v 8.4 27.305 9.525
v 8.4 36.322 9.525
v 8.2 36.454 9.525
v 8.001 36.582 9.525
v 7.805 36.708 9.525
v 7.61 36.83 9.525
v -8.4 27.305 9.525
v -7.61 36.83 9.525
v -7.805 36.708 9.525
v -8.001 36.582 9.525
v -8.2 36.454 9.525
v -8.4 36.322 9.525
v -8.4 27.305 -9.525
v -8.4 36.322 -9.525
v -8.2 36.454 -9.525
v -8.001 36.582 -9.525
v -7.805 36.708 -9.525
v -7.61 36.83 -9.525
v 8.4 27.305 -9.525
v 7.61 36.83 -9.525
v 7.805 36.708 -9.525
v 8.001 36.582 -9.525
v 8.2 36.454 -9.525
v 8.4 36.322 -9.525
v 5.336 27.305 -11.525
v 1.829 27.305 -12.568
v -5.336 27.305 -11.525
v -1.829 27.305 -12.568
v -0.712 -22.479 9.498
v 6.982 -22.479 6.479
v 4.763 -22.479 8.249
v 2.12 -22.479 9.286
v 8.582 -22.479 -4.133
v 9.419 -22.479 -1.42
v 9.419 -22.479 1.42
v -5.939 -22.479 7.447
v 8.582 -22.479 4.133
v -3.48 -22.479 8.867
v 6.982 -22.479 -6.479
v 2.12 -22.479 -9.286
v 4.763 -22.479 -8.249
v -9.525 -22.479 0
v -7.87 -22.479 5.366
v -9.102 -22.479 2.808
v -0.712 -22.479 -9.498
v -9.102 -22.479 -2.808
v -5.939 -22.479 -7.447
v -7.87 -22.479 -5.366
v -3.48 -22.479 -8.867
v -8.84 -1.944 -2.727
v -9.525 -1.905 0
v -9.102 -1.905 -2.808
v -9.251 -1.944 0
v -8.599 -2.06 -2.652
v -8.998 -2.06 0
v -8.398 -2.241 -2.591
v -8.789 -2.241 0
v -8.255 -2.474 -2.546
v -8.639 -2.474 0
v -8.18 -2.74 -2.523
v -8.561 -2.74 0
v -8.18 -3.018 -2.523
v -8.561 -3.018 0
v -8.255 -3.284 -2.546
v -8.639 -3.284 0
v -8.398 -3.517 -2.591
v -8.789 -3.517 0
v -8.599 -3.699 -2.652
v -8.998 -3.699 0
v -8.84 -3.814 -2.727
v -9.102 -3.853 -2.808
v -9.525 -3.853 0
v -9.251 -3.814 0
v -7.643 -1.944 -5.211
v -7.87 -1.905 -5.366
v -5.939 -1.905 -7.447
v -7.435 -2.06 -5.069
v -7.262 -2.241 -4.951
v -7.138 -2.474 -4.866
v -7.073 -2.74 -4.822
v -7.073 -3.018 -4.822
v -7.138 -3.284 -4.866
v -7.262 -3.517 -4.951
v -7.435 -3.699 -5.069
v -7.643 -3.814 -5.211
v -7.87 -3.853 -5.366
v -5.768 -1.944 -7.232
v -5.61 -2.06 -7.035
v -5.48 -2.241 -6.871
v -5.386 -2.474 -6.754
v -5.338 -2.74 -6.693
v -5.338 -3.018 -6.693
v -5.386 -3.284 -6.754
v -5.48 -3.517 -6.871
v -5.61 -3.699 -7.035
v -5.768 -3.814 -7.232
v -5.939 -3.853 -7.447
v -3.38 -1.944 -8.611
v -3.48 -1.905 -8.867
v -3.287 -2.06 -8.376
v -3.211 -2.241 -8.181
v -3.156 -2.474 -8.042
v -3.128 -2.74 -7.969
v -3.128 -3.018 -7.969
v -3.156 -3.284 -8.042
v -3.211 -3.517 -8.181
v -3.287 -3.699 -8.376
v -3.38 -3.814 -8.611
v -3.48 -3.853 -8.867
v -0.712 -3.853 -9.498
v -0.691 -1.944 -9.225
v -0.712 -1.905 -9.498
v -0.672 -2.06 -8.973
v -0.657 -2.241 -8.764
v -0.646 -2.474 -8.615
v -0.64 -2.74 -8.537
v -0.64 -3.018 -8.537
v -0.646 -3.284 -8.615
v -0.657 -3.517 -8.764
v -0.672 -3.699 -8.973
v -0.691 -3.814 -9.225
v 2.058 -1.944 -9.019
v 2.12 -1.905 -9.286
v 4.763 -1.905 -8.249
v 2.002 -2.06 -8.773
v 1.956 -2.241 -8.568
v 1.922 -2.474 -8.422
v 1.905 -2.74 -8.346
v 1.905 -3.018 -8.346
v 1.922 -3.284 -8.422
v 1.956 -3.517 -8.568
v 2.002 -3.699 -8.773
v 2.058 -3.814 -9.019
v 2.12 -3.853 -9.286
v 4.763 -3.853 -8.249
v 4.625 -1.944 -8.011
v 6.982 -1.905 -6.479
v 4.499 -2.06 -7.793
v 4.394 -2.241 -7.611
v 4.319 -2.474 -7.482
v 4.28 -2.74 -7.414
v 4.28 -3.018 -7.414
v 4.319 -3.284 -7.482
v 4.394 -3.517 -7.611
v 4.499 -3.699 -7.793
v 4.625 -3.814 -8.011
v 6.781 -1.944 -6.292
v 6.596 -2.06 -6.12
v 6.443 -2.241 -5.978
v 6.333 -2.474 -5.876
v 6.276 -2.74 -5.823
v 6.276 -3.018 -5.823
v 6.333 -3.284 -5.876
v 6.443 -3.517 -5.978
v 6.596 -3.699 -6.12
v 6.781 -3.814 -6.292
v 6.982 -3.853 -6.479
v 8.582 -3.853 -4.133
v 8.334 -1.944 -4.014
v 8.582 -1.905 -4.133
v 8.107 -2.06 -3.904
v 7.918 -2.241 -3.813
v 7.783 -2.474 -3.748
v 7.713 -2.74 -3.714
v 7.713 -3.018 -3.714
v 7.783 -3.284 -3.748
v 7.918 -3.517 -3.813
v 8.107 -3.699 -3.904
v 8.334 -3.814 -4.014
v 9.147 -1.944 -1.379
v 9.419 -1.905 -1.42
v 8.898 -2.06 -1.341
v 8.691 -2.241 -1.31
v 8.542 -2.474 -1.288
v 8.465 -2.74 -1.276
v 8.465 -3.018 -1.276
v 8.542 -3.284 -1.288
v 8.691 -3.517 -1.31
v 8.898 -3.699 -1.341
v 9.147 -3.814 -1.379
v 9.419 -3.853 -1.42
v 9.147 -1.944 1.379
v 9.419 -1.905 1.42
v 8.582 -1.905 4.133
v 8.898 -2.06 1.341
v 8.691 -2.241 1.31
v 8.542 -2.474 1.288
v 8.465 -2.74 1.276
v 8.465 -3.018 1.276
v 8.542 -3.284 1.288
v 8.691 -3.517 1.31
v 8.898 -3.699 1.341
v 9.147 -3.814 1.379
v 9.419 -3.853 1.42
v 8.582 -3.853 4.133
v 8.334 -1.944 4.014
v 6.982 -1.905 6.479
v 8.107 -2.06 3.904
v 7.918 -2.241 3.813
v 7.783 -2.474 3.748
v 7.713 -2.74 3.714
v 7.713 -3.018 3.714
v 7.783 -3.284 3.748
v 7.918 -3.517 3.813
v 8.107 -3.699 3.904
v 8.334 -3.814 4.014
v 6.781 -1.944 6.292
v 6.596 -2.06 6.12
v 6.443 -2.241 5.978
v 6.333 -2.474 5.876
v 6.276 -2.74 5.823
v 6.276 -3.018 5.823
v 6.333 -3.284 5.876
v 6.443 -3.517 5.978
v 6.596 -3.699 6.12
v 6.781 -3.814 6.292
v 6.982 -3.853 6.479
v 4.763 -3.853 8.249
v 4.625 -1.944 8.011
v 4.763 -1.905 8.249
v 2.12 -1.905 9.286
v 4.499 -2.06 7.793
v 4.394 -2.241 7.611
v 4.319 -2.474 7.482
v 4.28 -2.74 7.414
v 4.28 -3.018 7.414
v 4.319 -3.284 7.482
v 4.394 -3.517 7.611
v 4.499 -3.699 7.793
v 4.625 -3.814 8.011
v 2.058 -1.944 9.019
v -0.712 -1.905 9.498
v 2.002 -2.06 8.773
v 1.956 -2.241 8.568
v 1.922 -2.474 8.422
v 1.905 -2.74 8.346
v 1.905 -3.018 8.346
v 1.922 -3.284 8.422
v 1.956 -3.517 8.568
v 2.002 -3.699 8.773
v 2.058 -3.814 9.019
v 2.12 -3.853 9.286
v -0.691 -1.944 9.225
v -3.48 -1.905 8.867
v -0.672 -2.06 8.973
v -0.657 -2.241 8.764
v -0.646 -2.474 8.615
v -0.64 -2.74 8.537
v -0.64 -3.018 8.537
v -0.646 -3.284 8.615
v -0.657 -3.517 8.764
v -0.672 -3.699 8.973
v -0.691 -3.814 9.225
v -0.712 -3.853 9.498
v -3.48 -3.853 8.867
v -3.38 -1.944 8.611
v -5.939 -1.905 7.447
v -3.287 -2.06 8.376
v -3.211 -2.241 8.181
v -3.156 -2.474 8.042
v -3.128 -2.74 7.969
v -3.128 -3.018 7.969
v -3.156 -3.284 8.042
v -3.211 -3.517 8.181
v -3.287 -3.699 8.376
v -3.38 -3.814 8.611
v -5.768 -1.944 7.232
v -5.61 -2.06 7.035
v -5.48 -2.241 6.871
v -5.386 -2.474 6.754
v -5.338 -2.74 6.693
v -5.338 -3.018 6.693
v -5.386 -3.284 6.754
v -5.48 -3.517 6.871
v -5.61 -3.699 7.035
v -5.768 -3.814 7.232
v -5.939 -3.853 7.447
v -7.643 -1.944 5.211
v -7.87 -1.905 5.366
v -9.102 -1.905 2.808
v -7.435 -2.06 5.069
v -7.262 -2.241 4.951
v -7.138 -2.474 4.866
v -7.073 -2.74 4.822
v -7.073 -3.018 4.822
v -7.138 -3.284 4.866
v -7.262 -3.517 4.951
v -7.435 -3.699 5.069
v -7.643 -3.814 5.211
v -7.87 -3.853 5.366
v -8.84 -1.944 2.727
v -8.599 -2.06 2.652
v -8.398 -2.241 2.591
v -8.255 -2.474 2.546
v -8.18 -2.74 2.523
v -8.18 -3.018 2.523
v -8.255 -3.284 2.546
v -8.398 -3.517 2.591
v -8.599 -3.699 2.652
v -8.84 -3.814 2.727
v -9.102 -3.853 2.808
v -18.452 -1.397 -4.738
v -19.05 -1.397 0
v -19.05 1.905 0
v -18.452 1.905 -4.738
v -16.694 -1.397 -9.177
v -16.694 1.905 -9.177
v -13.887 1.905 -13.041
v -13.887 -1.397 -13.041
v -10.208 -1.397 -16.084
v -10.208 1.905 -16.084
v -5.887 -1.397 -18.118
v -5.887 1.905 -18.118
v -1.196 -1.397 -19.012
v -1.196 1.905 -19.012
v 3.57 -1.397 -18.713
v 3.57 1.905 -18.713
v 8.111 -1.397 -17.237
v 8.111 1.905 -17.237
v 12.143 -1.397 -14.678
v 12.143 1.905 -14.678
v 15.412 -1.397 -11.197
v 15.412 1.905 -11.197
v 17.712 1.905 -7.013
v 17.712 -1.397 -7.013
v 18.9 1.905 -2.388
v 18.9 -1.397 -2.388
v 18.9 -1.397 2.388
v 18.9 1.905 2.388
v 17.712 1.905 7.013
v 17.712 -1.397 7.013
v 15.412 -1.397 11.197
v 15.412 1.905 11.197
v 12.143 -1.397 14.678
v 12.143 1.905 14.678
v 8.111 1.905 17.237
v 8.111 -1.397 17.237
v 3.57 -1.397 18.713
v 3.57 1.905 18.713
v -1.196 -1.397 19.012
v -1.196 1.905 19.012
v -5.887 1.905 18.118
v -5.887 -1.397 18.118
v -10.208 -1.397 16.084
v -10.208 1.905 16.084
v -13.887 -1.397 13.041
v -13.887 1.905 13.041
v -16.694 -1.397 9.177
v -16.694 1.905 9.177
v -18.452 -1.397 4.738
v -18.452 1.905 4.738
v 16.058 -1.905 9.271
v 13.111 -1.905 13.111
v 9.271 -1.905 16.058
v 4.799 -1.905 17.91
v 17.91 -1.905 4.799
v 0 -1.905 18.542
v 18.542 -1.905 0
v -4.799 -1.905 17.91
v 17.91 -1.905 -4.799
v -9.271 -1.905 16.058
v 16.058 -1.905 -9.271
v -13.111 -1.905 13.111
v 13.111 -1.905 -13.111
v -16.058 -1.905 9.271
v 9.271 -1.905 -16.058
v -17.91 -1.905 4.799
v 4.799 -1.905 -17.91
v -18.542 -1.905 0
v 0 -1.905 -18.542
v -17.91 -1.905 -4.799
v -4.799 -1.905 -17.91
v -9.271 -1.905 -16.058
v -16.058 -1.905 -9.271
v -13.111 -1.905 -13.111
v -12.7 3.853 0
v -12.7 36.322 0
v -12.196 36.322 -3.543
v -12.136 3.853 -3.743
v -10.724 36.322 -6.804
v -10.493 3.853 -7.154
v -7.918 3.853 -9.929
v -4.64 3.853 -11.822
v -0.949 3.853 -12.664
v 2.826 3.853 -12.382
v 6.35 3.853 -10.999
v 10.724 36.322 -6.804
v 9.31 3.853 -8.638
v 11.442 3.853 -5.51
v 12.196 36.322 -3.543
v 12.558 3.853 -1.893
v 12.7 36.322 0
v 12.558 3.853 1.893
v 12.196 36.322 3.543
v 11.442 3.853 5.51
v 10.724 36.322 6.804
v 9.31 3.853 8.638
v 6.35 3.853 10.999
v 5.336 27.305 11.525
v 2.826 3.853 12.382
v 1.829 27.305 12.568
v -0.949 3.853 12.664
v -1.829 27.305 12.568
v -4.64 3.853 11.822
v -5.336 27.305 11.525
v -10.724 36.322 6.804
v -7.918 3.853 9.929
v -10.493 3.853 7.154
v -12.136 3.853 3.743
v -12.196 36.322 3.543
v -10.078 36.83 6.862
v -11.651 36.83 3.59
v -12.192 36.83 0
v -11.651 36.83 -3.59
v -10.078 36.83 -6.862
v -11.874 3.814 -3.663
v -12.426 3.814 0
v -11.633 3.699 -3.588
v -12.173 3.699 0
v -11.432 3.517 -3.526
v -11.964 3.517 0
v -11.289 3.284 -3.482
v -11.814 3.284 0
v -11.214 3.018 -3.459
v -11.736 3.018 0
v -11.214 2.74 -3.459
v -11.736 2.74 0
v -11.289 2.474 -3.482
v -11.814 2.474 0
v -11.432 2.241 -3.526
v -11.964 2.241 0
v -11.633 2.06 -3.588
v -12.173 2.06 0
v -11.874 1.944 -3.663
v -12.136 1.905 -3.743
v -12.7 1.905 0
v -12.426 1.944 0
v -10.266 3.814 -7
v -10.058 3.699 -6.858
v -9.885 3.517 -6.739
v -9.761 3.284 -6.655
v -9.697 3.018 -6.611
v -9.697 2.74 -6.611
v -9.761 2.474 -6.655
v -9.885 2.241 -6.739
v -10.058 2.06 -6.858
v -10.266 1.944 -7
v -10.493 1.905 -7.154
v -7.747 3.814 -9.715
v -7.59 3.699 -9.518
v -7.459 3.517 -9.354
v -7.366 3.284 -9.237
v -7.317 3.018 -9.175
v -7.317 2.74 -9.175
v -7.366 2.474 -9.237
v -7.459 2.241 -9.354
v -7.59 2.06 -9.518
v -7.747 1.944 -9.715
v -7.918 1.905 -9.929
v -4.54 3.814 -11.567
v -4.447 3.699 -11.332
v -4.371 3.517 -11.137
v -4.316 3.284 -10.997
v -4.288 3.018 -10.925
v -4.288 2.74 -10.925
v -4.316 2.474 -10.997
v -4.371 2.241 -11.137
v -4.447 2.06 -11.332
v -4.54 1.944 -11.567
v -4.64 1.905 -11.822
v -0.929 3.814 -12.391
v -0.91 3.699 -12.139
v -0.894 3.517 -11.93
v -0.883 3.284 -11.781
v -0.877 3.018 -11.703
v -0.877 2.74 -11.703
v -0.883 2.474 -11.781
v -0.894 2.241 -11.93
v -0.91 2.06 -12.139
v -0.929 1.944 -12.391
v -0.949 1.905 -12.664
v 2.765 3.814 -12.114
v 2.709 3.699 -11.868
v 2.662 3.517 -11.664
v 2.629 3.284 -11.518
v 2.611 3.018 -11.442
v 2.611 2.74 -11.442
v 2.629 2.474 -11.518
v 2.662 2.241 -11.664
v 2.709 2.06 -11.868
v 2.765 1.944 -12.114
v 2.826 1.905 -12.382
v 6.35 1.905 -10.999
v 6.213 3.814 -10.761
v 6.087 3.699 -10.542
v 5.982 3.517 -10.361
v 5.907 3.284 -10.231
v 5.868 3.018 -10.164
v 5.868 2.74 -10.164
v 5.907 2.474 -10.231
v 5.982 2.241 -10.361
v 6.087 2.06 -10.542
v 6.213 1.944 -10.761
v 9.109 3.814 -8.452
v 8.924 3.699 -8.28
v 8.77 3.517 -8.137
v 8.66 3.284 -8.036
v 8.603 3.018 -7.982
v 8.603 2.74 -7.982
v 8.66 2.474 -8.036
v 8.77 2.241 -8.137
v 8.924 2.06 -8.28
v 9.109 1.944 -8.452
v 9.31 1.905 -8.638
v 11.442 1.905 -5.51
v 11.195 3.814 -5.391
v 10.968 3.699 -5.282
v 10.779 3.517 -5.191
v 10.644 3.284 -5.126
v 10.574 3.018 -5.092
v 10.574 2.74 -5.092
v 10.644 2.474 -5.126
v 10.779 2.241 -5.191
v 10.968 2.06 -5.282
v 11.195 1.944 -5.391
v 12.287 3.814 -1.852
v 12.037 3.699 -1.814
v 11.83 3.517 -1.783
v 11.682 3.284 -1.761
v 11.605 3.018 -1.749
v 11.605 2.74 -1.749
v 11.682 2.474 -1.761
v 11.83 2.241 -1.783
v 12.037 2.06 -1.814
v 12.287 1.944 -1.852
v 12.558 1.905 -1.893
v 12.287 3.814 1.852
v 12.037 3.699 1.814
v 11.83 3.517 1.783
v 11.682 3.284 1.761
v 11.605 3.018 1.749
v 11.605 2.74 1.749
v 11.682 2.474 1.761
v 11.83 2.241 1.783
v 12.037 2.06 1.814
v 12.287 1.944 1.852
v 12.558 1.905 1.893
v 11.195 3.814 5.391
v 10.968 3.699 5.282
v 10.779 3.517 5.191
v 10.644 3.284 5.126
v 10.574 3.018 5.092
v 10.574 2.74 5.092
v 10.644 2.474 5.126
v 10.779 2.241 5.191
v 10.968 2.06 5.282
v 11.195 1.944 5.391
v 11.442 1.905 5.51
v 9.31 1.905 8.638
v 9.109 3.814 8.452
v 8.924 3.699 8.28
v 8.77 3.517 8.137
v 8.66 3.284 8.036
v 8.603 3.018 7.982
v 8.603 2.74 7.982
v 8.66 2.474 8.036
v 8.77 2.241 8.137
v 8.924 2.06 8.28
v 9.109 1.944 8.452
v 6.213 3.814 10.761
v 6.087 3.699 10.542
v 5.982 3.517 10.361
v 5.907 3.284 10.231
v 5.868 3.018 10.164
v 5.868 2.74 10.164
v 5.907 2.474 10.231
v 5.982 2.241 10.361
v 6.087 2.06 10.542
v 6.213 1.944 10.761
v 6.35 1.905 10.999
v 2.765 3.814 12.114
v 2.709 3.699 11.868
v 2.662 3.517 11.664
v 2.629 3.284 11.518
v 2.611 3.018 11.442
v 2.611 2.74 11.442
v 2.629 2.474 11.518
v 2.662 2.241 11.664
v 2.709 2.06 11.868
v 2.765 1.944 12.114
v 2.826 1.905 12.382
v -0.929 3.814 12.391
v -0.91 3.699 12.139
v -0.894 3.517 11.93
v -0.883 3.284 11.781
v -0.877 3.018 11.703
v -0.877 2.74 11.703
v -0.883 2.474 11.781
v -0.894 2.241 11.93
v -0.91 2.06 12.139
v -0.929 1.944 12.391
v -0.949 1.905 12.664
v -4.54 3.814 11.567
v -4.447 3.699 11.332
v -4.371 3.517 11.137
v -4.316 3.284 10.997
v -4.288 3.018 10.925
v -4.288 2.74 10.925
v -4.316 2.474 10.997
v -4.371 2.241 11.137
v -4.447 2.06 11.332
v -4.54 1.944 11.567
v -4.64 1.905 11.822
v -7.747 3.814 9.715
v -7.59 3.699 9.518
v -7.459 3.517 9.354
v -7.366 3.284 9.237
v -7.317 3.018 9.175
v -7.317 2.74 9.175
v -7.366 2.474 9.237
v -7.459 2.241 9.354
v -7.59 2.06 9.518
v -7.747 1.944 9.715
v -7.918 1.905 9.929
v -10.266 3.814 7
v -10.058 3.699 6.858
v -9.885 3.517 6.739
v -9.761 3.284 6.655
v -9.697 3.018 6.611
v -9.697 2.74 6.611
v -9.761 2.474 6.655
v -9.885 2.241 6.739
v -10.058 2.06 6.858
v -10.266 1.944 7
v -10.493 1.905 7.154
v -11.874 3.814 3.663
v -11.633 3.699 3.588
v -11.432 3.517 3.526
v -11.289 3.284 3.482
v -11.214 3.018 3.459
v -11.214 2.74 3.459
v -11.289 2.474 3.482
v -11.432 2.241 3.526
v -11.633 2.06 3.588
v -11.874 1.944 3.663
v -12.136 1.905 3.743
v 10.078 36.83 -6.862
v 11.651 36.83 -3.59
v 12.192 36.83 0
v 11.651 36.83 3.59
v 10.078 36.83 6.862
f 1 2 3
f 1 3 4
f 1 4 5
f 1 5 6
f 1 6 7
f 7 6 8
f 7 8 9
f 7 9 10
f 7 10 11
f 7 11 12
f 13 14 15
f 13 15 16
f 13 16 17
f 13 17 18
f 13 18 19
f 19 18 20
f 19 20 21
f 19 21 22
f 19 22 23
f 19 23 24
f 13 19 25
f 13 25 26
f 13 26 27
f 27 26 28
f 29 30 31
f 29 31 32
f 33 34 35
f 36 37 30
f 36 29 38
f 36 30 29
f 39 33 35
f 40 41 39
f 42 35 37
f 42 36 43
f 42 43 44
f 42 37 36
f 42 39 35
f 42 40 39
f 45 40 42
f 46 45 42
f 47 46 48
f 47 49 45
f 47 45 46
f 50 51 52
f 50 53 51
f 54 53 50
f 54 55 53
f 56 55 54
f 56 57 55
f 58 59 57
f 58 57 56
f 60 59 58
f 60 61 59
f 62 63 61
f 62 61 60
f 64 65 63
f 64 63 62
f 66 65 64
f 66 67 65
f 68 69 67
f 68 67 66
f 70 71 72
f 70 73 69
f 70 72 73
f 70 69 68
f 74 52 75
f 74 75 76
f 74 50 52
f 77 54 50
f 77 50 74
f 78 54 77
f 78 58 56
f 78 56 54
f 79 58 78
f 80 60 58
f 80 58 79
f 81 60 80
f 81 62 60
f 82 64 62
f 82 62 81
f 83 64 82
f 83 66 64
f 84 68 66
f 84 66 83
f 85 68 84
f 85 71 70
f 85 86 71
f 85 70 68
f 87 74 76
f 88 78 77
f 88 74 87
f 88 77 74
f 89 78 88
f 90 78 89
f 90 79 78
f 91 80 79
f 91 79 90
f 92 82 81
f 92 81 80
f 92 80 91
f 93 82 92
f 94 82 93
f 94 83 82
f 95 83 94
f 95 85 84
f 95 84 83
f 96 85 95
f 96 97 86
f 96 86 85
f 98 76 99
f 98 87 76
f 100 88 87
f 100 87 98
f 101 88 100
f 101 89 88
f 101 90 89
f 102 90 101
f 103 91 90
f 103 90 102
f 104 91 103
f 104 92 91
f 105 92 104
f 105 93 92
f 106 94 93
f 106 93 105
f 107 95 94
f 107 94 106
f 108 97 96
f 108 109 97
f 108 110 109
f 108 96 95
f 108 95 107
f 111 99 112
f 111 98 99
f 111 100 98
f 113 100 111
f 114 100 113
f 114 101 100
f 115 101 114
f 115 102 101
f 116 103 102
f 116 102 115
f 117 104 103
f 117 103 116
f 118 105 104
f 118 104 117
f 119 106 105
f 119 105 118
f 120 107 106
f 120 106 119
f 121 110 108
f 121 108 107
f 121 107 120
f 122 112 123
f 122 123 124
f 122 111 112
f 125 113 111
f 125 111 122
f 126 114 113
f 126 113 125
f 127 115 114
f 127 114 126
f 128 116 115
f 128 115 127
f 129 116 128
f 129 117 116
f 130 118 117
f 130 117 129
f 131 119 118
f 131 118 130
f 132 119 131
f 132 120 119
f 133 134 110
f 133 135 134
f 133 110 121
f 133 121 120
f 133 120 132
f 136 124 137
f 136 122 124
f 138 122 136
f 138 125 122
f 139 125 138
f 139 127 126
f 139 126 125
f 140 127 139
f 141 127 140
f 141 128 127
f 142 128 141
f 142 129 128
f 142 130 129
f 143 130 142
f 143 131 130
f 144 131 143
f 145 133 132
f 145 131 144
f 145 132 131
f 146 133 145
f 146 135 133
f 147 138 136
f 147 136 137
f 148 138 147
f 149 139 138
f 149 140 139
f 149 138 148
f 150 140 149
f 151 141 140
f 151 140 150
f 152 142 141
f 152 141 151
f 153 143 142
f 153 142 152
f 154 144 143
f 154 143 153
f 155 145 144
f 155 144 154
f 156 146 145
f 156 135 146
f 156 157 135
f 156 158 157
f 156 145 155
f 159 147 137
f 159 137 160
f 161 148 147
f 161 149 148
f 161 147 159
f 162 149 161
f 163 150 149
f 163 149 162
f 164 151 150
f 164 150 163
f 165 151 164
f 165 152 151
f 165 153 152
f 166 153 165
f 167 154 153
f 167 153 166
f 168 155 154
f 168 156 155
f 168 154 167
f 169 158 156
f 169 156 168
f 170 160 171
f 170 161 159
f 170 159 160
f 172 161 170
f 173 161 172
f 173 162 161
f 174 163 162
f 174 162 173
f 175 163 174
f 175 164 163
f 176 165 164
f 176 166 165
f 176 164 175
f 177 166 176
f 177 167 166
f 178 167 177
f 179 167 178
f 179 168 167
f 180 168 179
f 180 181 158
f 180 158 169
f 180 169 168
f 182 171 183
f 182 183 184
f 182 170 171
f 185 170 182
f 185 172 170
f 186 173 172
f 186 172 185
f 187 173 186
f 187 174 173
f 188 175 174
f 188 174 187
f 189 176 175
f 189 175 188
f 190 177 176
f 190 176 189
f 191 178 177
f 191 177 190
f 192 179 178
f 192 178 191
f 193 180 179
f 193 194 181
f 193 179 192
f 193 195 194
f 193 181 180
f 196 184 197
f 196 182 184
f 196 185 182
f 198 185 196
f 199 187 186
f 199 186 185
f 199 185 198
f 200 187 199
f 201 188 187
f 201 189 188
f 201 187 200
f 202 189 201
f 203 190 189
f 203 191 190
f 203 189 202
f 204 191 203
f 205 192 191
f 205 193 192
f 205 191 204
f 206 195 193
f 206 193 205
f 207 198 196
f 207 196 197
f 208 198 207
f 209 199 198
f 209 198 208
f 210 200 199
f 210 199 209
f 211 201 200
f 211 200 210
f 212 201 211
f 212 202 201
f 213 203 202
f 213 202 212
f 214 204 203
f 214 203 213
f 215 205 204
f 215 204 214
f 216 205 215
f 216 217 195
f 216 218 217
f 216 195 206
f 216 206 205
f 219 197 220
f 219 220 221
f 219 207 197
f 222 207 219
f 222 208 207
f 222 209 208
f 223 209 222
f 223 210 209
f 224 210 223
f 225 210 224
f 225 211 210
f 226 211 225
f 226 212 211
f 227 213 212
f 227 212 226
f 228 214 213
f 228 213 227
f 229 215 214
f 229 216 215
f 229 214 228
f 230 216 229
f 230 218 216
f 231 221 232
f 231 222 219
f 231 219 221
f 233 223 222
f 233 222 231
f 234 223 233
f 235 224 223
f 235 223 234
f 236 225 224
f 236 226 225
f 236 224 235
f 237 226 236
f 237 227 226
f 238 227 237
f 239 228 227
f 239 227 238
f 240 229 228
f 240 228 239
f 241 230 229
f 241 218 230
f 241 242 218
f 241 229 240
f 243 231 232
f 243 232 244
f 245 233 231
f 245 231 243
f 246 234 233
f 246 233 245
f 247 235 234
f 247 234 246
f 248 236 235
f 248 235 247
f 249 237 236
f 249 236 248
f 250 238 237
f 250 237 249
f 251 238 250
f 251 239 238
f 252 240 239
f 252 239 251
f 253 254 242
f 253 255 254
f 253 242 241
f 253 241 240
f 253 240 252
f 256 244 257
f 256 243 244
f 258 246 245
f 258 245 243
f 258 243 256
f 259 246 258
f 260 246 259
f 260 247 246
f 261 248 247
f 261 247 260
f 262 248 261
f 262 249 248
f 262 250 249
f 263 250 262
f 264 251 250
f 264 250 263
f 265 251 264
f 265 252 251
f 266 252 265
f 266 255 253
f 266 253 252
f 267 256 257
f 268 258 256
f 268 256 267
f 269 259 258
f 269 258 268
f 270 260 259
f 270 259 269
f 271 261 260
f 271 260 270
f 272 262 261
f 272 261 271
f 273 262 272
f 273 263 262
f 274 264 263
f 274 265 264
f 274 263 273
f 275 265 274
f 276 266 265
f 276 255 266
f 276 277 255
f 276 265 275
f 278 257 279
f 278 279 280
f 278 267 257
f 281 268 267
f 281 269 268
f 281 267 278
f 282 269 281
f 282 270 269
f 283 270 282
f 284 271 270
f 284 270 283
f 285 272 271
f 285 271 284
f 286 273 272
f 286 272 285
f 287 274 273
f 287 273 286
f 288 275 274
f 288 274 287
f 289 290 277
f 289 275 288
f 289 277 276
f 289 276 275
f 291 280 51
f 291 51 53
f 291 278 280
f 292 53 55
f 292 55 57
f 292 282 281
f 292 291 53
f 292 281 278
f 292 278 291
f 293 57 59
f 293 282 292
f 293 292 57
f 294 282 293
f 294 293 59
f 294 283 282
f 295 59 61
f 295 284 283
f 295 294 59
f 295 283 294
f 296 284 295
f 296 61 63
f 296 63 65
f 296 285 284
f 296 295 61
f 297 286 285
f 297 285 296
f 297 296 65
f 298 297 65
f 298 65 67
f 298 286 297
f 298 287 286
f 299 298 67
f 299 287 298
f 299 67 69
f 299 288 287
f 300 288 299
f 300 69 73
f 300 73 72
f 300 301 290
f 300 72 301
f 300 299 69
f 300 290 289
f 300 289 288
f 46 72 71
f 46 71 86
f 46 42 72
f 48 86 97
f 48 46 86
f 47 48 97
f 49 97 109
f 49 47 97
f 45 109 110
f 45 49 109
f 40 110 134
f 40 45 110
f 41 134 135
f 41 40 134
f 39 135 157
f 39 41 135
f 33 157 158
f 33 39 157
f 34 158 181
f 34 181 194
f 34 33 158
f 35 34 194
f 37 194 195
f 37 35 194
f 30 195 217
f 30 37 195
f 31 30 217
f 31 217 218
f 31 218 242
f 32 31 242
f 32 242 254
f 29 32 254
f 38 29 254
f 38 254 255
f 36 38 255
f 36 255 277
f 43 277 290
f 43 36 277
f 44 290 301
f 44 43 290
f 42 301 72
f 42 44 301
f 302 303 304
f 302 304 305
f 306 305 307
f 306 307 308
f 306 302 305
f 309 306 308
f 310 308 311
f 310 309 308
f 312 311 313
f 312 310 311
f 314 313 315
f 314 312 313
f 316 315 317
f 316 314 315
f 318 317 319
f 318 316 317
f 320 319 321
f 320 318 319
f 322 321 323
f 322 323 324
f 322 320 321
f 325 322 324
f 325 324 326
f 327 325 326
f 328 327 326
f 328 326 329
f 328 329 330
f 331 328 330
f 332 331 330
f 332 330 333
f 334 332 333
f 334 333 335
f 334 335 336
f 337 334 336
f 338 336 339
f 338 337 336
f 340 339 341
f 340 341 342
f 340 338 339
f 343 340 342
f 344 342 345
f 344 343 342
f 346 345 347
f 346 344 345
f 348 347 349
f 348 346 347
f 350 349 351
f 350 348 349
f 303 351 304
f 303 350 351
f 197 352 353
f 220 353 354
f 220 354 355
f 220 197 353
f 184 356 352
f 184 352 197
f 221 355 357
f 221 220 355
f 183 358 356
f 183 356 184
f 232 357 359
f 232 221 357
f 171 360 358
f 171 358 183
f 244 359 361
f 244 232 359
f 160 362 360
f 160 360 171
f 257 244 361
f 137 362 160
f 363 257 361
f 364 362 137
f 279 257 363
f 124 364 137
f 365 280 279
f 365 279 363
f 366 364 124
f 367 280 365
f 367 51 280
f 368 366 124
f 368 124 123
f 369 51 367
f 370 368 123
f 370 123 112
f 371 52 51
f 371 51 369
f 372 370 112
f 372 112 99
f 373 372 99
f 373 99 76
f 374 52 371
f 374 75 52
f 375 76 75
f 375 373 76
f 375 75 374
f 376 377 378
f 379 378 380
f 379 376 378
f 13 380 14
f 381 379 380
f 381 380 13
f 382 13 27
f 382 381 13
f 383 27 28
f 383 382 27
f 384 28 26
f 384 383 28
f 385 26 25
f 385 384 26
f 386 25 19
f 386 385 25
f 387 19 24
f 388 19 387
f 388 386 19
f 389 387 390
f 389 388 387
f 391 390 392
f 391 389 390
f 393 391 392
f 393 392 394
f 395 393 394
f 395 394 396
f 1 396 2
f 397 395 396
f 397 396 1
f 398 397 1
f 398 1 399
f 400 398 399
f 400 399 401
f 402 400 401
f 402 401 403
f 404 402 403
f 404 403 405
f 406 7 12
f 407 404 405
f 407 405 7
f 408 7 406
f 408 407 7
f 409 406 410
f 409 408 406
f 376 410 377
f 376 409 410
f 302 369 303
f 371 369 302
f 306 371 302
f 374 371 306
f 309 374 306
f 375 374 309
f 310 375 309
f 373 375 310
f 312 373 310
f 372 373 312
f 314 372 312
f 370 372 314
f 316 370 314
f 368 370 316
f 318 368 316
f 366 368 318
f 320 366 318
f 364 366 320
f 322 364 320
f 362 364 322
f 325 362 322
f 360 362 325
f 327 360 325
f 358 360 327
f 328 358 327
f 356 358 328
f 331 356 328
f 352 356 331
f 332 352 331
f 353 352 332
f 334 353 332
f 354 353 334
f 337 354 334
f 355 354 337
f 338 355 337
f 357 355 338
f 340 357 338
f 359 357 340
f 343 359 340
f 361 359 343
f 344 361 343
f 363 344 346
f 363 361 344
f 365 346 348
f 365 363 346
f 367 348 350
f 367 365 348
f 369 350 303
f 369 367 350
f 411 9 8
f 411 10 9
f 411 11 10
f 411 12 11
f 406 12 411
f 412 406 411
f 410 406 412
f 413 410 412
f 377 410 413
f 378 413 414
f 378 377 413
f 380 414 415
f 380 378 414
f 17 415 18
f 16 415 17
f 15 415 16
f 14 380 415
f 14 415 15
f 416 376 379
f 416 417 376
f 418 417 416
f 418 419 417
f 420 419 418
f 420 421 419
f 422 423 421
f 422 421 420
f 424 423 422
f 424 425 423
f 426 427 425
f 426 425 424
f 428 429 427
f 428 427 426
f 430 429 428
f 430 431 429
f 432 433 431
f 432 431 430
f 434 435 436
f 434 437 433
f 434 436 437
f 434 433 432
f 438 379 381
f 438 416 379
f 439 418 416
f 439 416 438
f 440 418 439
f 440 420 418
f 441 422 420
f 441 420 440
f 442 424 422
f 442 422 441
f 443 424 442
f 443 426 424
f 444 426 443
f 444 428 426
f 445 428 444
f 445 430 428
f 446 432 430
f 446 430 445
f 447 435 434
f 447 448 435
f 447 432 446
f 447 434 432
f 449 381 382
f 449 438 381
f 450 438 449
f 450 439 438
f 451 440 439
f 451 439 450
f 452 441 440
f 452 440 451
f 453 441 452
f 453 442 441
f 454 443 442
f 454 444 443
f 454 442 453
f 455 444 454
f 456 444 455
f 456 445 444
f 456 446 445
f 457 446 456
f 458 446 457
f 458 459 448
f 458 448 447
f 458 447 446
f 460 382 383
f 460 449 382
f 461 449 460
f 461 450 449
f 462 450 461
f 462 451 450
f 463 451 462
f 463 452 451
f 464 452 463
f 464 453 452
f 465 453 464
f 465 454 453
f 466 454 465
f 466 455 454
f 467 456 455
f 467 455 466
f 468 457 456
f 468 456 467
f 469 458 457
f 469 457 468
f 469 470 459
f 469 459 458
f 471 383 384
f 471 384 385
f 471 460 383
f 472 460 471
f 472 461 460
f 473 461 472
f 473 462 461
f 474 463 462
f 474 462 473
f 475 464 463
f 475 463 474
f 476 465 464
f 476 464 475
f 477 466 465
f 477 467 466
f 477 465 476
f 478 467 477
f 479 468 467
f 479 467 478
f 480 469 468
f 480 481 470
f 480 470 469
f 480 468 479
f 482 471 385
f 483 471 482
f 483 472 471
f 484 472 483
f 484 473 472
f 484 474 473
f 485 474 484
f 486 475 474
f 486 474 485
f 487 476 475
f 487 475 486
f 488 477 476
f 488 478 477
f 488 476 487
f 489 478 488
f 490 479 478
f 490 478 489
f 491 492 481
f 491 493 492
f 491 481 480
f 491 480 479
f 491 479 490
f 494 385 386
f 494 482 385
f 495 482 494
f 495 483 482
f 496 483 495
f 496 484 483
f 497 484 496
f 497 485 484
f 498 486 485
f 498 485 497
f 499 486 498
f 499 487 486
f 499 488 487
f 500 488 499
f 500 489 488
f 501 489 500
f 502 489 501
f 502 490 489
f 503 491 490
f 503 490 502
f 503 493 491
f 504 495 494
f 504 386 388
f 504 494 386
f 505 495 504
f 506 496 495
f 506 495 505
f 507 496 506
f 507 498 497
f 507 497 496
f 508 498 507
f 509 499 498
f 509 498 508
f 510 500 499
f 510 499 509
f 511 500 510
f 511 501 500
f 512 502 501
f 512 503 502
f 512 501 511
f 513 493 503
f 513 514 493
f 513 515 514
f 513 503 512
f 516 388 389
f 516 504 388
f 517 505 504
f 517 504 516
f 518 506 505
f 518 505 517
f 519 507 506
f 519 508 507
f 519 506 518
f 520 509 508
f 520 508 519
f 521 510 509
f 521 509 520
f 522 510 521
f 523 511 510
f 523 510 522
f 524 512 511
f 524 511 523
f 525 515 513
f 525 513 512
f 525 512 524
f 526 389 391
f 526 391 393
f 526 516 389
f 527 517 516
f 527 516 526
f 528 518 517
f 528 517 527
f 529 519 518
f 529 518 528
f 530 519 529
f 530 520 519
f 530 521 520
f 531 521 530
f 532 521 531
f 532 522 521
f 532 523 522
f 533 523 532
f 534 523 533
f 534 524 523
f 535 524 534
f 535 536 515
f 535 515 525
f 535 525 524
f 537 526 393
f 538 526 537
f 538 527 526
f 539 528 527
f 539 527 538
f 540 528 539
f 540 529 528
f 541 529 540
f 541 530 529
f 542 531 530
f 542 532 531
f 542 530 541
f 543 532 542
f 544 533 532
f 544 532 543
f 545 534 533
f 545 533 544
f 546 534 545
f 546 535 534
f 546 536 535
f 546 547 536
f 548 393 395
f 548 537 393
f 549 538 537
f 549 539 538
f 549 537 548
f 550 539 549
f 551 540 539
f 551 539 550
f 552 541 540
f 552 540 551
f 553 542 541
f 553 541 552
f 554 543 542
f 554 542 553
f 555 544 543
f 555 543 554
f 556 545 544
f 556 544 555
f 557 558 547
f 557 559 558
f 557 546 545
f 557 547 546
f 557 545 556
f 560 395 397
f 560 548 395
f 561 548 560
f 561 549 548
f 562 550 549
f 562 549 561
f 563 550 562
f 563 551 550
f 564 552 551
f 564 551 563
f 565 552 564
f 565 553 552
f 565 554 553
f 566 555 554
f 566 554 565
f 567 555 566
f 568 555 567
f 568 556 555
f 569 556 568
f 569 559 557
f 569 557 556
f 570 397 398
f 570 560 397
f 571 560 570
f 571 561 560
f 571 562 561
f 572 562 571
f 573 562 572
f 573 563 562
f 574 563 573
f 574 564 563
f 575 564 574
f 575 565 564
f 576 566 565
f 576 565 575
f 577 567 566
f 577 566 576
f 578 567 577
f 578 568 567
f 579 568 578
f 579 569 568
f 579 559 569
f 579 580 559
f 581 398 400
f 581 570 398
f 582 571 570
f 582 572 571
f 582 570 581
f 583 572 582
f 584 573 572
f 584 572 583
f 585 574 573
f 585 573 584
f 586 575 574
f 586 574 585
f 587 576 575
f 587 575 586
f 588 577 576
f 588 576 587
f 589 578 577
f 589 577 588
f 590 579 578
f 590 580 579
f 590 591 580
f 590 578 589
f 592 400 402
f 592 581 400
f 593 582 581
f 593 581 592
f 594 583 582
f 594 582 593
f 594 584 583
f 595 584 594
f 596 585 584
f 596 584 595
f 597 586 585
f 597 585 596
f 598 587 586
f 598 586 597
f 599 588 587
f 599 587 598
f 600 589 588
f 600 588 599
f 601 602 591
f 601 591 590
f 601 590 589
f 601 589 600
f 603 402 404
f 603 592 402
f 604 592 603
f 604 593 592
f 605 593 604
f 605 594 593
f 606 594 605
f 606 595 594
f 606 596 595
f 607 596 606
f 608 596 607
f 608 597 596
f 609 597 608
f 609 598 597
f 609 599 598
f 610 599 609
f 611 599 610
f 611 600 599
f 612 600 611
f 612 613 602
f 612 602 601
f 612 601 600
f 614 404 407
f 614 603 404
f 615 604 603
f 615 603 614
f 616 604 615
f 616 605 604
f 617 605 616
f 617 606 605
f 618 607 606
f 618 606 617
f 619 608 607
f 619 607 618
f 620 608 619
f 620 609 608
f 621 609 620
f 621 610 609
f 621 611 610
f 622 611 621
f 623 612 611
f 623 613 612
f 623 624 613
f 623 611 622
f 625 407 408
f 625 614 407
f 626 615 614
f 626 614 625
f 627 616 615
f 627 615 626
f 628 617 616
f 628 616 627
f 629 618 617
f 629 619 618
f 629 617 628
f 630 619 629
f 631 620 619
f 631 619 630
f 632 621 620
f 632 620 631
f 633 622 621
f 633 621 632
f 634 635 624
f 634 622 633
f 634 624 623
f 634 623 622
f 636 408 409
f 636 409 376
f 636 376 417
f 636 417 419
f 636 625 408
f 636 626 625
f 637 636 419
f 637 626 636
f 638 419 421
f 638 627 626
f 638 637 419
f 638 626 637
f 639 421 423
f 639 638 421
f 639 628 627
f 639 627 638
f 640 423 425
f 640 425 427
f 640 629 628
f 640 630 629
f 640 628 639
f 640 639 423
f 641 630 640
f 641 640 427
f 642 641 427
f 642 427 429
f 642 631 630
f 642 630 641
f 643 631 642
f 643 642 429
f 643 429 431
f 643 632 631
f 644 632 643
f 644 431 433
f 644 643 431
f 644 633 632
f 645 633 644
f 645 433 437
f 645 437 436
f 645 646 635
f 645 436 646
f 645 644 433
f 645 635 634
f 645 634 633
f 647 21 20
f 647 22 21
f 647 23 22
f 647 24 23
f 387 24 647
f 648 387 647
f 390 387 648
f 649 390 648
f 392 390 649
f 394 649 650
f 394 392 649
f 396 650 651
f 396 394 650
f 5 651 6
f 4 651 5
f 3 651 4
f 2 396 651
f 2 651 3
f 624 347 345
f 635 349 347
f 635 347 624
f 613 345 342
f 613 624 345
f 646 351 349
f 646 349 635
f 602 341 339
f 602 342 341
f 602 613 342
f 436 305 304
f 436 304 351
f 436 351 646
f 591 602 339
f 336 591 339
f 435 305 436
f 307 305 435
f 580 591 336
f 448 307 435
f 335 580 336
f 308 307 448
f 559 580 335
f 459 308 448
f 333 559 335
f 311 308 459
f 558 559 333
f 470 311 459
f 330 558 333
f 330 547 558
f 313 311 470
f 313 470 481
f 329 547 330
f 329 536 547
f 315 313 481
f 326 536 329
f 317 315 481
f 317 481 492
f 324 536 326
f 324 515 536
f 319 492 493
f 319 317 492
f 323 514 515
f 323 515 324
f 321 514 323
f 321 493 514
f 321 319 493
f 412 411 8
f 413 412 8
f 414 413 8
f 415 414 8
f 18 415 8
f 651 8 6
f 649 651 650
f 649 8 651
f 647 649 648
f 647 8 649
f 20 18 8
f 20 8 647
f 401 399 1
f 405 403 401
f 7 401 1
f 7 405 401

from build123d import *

# Parameters (mm, degrees)
F2_SIZE  = 0.508
F3_SIZE  = 0.508
F5_DEPTH = 9.525


with BuildPart() as f1:
    # F0 (on Top) → F1 (revolve)
    with BuildSketch(Plane.XY):
        Polygon((-9.525, -1.905), (0, -1.905), (0, 1.905), (-12.7, 1.905), (-19.05, 1.905), (-19.05, -1.905), align=None)
        with BuildLine():
            Line((0, -22.479), (0, -1.905))
            Line((0, -1.905), (-9.525, -1.905))
            ThreePointArc((-9.525, -1.905), (-8.55091, -2.87909), (-9.525, -3.85318))
            Line((-9.525, -3.85318), (-9.525, -22.479))
            Line((-9.525, -22.479), (0, -22.479))
        make_face()
        with BuildLine():
            Line((-12.7, 1.905), (0, 1.905))
            Line((0, 1.905), (0, 36.83))
            Line((0, 36.83), (-12.7, 36.83))
            Line((-12.7, 36.83), (-12.7, 3.85318))
            ThreePointArc((-12.7, 3.85318), (-11.72591, 2.87909), (-12.7, 1.905))
        make_face()
    revolve(axis=Axis((0, 7.1755, 0), (0, -1, 0)))

    # F2
    f2_edges = [f1.edges().sort_by_distance(p)[0] for p in [
        (12.7, 36.83, 0),
    ]]
    chamfer(f2_edges, length=F2_SIZE)

    # F3
    f3_edges = [f1.edges().sort_by_distance(p)[0] for p in [
        (19.05, -1.905, 0),
    ]]
    chamfer(f3_edges, length=F3_SIZE)

    # F4 (on face) → F5 (cut)
    with BuildSketch(Plane(origin=(0, 36.83, 0), x_dir=(-1, 0, 0), z_dir=(0, 1, 0))):
        with BuildLine():
            Line((-7.6104690394, 9.525), (7.6104690394, 9.525))
            ThreePointArc((7.6104690394, 9.525), (0, 12.192), (-7.6104690394, 9.525))
        make_face()
        with BuildLine():
            Line((7.6104690394, 9.525), (12.7, 9.525))
            Line((12.7, 9.525), (12.7, 12.7))
            Line((12.7, 12.7), (-12.7, 12.7))
            Line((-12.7, 12.7), (-12.7, 9.525))
            Line((-12.7, 9.525), (-7.6104690394, 9.525))
            ThreePointArc((-7.6104690394, 9.525), (0, 12.192), (7.6104690394, 9.525))
        make_face()
        with BuildLine():
            Line((-12.7, -12.7), (12.7, -12.7))
            Line((12.7, -12.7), (12.7, -9.525))
            Line((12.7, -9.525), (7.6104690394, -9.525))
            ThreePointArc((7.6104690394, -9.525), (0, -12.192), (-7.6104690394, -9.525))
            Line((-7.6104690394, -9.525), (-12.7, -9.525))
            Line((-12.7, -9.525), (-12.7, -12.7))
        make_face()
        with BuildLine():
            ThreePointArc((-7.6104690394, -9.525), (0, -12.192), (7.6104690394, -9.525))
            Line((7.6104690394, -9.525), (-7.6104690394, -9.525))
        make_face()
    extrude(amount=-F5_DEPTH, mode=Mode.SUBTRACT)


solid = f1.part
